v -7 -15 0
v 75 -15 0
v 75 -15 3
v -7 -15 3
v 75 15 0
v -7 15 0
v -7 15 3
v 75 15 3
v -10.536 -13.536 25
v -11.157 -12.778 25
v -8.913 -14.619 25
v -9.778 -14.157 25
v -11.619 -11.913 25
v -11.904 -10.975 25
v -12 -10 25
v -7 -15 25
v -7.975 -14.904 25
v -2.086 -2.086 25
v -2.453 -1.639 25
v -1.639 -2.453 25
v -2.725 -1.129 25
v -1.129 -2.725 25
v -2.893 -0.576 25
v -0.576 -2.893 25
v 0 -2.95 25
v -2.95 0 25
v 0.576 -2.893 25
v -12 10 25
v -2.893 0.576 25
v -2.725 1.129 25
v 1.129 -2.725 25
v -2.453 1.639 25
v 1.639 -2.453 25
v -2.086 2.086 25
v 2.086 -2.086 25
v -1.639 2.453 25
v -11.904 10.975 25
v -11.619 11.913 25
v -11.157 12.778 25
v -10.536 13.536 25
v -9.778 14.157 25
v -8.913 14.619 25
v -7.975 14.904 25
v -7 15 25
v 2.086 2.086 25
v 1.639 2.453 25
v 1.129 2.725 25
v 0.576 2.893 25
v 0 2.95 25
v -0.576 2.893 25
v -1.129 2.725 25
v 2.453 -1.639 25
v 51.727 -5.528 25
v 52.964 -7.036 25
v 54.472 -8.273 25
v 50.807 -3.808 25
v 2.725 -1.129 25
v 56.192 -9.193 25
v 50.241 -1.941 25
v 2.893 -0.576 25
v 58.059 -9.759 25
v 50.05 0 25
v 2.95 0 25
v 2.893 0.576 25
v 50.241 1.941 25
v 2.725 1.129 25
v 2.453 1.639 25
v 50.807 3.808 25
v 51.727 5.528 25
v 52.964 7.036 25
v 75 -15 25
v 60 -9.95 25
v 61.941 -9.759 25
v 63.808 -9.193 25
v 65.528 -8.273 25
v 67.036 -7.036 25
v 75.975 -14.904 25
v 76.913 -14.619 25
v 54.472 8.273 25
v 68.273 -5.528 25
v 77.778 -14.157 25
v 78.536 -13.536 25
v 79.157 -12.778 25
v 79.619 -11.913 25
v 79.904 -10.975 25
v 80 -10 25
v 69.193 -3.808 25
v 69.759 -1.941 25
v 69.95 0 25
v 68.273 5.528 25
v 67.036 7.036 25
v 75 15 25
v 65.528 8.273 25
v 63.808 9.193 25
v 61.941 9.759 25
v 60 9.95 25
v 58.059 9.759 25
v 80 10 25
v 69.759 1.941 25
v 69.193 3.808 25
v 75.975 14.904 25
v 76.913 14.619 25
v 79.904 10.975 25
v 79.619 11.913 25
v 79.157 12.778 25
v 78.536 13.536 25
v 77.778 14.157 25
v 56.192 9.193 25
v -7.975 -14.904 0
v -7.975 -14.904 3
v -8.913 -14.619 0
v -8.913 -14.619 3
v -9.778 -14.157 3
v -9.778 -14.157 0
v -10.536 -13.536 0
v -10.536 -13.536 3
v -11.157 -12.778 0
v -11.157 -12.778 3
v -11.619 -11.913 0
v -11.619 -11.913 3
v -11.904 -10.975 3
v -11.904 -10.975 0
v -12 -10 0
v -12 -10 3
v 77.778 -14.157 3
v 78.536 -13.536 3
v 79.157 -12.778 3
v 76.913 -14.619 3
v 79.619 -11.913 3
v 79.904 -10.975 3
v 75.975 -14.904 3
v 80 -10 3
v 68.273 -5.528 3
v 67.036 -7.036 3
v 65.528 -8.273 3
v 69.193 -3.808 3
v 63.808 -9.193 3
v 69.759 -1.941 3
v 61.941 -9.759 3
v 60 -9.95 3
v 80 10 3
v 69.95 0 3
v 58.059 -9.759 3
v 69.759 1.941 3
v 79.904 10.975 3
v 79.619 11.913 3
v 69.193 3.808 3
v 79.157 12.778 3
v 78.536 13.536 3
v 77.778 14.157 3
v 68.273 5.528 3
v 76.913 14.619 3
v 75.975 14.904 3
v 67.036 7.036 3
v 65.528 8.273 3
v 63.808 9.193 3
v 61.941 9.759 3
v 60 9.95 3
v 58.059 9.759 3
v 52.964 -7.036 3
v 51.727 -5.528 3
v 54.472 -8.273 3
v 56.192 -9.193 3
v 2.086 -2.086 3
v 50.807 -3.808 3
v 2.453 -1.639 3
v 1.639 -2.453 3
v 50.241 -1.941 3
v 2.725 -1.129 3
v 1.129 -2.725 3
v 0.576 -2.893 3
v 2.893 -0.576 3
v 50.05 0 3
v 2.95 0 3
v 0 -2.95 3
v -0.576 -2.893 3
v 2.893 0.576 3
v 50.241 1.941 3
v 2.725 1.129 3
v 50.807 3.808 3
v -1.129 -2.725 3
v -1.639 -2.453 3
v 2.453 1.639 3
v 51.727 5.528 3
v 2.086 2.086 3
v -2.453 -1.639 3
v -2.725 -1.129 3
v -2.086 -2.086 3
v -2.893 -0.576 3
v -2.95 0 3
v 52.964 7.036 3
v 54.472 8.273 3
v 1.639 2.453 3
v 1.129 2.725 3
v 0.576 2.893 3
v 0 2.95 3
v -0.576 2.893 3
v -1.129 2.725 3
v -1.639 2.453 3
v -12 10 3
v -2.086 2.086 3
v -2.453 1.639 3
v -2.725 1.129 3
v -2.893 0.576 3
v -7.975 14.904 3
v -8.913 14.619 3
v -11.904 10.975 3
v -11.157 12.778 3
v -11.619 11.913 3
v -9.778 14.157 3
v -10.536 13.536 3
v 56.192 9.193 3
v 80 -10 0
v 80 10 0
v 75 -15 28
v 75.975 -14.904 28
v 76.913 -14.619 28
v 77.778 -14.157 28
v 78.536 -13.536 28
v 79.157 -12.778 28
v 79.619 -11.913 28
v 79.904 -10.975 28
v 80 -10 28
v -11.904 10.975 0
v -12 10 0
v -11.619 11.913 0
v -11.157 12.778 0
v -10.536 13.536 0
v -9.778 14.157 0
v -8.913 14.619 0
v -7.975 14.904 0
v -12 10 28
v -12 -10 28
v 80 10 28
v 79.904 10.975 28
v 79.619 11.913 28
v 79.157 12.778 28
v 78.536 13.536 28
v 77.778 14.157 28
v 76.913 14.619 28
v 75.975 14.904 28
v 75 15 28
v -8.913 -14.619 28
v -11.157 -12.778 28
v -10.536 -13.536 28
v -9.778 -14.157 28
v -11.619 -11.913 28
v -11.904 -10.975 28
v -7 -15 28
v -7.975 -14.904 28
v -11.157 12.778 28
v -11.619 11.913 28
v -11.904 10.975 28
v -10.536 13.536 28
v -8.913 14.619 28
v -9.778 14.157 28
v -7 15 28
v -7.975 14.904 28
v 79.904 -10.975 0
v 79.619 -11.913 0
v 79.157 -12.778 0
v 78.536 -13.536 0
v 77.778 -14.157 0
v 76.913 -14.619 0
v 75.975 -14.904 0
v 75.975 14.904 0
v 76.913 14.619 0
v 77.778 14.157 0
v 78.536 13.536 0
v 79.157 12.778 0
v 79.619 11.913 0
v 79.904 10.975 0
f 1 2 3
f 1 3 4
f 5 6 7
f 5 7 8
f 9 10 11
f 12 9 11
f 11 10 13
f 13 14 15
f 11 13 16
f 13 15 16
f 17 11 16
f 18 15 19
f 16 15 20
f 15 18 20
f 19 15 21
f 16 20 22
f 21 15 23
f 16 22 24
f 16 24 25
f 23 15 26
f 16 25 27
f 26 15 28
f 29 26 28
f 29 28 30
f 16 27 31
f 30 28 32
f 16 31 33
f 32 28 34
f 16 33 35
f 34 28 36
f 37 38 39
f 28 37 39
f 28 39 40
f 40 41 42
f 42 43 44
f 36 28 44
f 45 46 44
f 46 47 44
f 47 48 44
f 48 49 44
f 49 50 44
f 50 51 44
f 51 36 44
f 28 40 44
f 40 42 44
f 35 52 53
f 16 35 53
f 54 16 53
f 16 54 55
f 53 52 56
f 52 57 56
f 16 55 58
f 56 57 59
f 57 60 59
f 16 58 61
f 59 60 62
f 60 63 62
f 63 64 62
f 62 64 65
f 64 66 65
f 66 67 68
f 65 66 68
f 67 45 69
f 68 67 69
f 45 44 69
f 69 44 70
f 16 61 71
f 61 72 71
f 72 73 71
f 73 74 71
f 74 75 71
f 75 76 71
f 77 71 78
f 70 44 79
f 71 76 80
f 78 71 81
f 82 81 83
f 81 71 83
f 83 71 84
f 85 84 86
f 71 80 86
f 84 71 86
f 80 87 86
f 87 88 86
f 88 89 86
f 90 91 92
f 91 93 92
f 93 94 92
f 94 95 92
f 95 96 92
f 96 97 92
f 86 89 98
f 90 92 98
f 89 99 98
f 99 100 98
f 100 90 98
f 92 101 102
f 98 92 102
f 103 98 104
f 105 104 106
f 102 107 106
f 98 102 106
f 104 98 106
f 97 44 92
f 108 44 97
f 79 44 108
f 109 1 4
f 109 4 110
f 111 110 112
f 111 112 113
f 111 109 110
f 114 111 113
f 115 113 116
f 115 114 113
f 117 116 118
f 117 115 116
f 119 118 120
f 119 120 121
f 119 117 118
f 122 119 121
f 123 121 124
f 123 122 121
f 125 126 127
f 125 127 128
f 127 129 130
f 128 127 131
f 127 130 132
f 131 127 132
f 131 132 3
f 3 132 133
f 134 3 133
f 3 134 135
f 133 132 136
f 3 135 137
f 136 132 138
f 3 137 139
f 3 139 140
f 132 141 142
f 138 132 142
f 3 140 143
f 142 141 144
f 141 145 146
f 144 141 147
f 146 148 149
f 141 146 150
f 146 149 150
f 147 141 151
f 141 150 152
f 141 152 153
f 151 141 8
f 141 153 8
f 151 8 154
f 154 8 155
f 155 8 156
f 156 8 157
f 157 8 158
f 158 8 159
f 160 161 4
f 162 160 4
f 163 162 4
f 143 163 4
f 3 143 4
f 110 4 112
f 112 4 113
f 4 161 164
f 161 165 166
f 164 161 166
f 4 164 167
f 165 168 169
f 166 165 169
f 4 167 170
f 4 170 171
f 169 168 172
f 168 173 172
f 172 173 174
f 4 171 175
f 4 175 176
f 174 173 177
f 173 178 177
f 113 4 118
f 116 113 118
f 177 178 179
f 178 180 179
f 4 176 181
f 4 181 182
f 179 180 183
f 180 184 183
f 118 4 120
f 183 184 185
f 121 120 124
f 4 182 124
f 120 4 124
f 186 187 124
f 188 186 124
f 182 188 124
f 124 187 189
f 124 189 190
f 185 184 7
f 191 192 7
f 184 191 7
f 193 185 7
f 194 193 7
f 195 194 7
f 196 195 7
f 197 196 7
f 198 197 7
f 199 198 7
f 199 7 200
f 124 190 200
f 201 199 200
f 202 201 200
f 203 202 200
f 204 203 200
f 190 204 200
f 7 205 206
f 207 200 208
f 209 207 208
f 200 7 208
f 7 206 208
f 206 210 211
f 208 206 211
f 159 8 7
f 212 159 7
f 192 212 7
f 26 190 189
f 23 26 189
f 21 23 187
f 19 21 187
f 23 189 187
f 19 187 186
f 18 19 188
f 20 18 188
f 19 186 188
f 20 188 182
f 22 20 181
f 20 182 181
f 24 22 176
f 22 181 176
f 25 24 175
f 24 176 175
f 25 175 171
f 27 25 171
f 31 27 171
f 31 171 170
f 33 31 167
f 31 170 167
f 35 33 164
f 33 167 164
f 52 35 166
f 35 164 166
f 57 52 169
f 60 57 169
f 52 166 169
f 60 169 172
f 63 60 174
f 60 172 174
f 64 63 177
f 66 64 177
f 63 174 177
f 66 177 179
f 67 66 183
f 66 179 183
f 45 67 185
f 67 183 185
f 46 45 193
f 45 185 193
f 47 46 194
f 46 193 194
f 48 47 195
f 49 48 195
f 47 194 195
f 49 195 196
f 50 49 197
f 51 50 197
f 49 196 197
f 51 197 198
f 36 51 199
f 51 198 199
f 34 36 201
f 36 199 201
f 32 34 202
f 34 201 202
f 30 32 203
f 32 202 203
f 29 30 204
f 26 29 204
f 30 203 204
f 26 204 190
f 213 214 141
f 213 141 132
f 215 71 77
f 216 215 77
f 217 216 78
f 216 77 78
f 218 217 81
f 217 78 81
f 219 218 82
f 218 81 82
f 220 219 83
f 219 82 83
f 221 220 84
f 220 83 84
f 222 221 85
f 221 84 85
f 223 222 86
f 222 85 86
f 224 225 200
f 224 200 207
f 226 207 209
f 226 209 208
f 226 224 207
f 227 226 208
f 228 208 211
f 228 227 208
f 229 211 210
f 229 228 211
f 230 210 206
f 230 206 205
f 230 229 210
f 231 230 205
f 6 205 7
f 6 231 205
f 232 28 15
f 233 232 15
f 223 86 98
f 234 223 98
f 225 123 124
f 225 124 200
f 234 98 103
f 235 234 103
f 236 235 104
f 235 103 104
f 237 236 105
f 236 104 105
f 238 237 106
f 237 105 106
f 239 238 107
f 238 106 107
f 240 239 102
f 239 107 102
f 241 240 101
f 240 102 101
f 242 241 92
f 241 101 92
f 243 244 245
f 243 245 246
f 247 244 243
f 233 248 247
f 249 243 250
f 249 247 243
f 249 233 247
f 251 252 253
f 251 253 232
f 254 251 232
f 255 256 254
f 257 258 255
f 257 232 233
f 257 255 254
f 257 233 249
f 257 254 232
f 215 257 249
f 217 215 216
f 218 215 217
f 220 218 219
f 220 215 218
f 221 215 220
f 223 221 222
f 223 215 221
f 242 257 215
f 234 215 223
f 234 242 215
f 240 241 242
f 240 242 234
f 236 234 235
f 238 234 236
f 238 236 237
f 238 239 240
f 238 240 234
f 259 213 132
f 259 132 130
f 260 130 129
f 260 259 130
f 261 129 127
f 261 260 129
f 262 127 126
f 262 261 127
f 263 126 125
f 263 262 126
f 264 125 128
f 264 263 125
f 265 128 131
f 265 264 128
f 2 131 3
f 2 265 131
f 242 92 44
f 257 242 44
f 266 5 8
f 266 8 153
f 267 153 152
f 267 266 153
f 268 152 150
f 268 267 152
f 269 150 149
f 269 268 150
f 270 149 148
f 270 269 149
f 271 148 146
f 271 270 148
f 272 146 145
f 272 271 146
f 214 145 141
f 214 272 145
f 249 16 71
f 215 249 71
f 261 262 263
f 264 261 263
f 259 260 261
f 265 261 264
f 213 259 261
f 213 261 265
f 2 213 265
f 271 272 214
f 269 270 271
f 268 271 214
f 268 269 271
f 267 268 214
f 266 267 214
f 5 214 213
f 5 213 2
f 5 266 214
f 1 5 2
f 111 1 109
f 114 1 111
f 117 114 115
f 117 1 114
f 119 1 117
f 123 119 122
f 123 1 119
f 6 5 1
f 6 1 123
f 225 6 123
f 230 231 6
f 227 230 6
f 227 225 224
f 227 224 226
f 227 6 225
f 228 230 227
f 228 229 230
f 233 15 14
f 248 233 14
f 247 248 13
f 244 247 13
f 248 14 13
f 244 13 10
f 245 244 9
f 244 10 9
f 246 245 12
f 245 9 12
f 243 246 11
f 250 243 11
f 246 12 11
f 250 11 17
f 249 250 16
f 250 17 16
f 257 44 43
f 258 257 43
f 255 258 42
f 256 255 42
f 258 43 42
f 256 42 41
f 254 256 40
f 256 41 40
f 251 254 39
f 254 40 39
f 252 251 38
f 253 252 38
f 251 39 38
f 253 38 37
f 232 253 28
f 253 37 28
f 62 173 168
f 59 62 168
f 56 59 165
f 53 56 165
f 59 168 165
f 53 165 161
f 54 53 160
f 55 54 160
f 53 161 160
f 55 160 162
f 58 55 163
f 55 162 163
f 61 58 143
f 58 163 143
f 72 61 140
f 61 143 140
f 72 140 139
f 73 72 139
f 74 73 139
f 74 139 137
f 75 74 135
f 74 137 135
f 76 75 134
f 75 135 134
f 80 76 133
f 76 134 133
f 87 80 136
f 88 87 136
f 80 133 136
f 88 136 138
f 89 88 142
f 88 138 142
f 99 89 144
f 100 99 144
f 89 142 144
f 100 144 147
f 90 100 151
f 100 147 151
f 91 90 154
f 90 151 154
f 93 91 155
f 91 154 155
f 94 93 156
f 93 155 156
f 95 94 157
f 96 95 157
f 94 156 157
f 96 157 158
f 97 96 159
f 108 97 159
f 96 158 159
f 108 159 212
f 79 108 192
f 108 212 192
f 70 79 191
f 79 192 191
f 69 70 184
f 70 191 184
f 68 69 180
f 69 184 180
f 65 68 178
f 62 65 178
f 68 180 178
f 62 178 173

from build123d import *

# Parameters (mm, degrees)
BOSS_EXTRUDE1_DEPTH = 3
SKETCH2_R           = 2.95
SKETCH2_R_2         = 9.95
BOSS_EXTRUDE2_DEPTH = 22
BOSS_EXTRUDE3_DEPTH = 3


with BuildPart() as part:
    # Sketch1 → Boss-Extrude1 (new body)
    with BuildSketch(Plane.XY):
        with BuildLine():
            Line((-7, 15), (75, 15))
            ThreePointArc((75, 15), (78.535533906, 13.535533906), (80, 10))
            Line((80, 10), (80, -10))
            ThreePointArc((80, -10), (78.535533906, -13.535533906), (75, -15))
            Line((75, -15), (-7, -15))
            ThreePointArc((-7, -15), (-10.535533906, -13.535533906), (-12, -10))
            Line((-12, -10), (-12, 10))
            ThreePointArc((-12, 10), (-10.535533906, 13.535533906), (-7, 15))
        make_face()
    extrude(amount=BOSS_EXTRUDE1_DEPTH)

    # Sketch2 → Boss-Extrude2 (add)
    with BuildSketch(Plane.XY.offset(3)):
        with Locations(Location((0, 0, 0), (0, 0, 180))):
            Circle(SKETCH2_R)
        with Locations(Location((60, 0, 0), (0, 0, 180))):
            Circle(SKETCH2_R_2)
    extrude(amount=BOSS_EXTRUDE2_DEPTH)

    # Sketch3 → Boss-Extrude3 (add)
    with BuildSketch(Plane.XY.offset(25)):
        with BuildLine():
            Line((75, 15), (-7, 15))
            ThreePointArc((-7, 15), (-10.535533906, 13.535533906), (-12, 10))
            Line((-12, 10), (-12, -10))
            ThreePointArc((-12, -10), (-10.535533906, -13.535533906), (-7, -15))
            Line((-7, -15), (75, -15))
            ThreePointArc((75, -15), (78.535533906, -13.535533906), (80, -10))
            Line((80, -10), (80, 10))
            ThreePointArc((80, 10), (78.535533906, 13.535533906), (75, 15))
        make_face()
    extrude(amount=BOSS_EXTRUDE3_DEPTH)


solid = part.part
